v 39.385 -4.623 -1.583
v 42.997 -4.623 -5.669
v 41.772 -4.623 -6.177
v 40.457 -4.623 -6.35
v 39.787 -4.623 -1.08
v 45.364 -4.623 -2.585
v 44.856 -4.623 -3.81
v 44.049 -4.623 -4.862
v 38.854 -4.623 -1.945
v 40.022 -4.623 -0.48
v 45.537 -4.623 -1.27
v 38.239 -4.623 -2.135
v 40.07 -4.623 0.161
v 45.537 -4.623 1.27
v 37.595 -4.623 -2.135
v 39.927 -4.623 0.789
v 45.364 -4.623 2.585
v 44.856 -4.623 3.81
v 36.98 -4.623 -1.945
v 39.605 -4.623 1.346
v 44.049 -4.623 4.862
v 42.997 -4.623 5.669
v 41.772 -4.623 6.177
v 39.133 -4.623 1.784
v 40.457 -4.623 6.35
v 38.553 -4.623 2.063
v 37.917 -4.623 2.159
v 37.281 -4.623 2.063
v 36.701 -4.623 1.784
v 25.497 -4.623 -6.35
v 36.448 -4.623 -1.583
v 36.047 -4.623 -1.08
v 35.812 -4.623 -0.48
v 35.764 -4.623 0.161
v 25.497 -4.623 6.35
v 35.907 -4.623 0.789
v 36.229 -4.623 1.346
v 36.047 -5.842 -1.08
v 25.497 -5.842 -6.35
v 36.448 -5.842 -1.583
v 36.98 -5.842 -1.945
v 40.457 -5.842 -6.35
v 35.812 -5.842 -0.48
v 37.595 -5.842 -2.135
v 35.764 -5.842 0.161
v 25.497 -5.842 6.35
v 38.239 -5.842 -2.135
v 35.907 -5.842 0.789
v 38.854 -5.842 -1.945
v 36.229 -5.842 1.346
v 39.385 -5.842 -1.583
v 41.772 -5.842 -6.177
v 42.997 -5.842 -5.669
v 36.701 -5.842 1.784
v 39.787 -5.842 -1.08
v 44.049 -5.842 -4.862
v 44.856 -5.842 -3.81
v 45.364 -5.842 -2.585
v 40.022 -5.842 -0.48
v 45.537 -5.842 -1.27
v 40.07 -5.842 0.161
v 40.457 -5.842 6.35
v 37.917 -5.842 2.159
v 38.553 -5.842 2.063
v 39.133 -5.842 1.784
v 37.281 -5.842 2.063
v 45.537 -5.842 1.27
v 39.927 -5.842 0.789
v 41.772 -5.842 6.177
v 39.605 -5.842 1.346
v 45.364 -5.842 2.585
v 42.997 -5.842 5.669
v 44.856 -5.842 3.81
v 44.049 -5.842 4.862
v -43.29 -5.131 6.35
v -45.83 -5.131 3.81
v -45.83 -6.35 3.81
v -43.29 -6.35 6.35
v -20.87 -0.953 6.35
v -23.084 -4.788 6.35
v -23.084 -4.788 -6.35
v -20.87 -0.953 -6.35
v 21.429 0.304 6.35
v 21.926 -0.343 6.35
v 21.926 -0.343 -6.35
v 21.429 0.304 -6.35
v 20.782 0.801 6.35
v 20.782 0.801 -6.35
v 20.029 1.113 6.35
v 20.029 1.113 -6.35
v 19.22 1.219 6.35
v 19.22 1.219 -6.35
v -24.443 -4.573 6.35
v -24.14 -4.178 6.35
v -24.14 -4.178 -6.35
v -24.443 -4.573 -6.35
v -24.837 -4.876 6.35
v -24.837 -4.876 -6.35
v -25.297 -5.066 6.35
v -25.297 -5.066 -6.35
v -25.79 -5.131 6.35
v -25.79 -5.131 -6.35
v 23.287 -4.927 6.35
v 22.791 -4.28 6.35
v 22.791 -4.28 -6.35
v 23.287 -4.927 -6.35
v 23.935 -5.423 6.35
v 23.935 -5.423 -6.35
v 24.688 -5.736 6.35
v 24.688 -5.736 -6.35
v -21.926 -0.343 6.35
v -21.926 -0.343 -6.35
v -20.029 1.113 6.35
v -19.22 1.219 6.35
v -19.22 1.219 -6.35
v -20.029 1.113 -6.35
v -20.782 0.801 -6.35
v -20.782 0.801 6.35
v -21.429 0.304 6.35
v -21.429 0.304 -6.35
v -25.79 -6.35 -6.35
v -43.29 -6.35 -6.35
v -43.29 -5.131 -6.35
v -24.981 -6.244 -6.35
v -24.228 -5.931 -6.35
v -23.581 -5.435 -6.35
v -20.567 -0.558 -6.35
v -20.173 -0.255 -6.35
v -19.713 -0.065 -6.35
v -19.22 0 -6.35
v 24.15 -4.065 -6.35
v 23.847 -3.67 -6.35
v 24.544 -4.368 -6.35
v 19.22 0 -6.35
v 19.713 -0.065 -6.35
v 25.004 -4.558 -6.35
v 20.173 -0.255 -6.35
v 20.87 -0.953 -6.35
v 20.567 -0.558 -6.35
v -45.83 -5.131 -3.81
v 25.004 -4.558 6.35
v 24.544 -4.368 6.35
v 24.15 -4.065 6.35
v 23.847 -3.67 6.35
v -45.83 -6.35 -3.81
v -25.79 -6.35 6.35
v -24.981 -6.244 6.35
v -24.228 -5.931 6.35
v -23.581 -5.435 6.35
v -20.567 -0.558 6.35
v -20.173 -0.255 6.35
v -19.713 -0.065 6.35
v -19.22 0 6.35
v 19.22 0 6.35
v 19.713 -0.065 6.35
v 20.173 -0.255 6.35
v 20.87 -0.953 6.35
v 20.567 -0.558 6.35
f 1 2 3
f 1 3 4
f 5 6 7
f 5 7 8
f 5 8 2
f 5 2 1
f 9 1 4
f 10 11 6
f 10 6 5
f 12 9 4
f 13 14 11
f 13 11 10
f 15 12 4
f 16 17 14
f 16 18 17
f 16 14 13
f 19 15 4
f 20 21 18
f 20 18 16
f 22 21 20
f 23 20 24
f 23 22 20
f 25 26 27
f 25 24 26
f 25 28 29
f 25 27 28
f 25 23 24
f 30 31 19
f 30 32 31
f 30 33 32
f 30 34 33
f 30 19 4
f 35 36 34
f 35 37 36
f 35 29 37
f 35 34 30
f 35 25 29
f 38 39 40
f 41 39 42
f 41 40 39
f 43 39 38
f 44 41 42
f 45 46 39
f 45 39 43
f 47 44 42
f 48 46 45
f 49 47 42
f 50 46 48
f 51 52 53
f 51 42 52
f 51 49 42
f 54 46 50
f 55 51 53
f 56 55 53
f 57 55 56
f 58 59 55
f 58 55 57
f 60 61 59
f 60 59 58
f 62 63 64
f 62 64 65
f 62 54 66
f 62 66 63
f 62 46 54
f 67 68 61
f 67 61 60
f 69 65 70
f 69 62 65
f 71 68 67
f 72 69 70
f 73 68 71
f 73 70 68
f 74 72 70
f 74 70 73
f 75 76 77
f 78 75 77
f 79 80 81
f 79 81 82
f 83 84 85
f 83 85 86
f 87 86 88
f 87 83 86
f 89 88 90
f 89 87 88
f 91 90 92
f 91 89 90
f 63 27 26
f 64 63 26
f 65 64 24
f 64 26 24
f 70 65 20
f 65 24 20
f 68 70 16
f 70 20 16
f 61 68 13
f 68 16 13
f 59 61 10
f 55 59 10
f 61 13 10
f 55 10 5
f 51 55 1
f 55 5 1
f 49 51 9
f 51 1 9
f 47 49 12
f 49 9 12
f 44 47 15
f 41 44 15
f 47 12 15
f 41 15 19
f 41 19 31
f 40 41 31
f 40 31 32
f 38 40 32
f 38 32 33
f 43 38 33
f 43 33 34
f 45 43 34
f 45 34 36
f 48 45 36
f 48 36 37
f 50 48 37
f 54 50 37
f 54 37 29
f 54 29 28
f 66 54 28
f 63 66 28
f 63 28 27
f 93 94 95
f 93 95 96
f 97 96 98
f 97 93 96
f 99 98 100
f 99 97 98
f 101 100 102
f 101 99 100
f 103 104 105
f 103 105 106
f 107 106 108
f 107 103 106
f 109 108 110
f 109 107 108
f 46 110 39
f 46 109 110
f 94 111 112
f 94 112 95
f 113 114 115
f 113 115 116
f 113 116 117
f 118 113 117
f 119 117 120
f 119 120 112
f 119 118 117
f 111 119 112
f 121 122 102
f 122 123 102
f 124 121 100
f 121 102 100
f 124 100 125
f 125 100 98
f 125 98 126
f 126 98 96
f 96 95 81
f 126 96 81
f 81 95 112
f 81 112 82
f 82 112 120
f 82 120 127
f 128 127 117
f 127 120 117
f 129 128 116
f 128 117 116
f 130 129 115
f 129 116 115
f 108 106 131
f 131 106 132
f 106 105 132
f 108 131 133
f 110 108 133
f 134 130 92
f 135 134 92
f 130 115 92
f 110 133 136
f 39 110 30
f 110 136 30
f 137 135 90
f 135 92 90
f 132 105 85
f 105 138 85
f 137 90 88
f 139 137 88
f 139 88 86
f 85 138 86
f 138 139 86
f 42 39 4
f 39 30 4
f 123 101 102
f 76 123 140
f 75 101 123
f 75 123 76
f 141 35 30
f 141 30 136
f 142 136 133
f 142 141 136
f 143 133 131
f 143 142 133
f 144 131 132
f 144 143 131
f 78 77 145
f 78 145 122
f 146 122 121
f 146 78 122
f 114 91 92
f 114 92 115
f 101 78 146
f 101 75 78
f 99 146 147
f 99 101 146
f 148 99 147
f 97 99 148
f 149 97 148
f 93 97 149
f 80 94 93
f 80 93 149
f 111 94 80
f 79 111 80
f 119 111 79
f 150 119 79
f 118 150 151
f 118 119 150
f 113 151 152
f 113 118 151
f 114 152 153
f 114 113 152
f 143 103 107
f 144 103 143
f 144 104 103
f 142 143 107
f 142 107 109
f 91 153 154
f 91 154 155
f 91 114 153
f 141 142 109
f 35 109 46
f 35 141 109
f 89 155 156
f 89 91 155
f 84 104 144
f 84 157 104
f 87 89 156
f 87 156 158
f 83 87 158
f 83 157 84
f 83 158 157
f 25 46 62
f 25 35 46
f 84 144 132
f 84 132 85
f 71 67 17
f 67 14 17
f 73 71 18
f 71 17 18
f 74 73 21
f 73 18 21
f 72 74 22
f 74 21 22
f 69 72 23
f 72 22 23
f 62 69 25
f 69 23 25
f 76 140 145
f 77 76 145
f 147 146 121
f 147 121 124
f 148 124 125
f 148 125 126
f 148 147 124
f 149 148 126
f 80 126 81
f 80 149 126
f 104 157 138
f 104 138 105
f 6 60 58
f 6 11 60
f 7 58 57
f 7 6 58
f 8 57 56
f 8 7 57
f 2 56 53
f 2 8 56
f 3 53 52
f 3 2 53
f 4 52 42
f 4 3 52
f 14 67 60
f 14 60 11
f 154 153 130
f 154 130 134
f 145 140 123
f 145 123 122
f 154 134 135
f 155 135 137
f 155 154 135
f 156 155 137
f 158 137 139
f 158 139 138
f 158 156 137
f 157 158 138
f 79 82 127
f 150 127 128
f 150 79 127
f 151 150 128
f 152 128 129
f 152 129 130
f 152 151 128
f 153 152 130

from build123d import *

# Parameters (mm, degrees)
EXTRUDE_THIN1_DEPTH = 6.35
FILLET1_R           = 5.08
CHAMFER1_SIZE       = 2.54
SKETCH2_R           = 2.159
CUT_EXTRUDE1_DEPTH  = 47.635354958


with BuildPart() as part:
    # Sketch1 → Extrude-Thin1 (new, symmetric)
    with BuildSketch(Plane.XY):
        with BuildLine():
            Line((-45.830174209, -6.35), (-25.78993192, -6.35))
            ThreePointArc((-25.78993192, -6.35), (-24.22783192, -5.931436567), (-23.084295354, -4.7879))
            Line((-23.084295354, -4.7879), (-20.869926131, -0.9525))
            ThreePointArc((-20.869926131, -0.9525), (-20.172647737, -0.255221606), (-19.220147737, 0))
            Line((-19.220147737, 0), (19.220147737, 0))
            ThreePointArc((19.220147737, 0), (20.172647737, -0.255221606), (20.869926131, -0.9525))
            Line((20.869926131, -0.9525), (22.791001417, -4.2799))
            ThreePointArc((22.791001417, -4.2799), (23.934537984, -5.423436567), (25.496637984, -5.842))
            Line((25.496637984, -5.842), (45.536880273, -5.842))
            Line((45.536880273, -5.842), (45.536880273, -4.6228))
            Line((45.536880273, -4.6228), (25.496637984, -4.6228))
            ThreePointArc((25.496637984, -4.6228), (24.544137984, -4.367578394), (23.846859589, -3.6703))
            Line((23.846859589, -3.6703), (21.925784304, -0.3429))
            ThreePointArc((21.925784304, -0.3429), (20.782247737, 0.800636567), (19.220147737, 1.2192))
            Line((19.220147737, 1.2192), (-19.220147737, 1.2192))
            ThreePointArc((-19.220147737, 1.2192), (-20.782247737, 0.800636567), (-21.925784304, -0.3429))
            Line((-21.925784304, -0.3429), (-24.140153526, -4.1783))
            ThreePointArc((-24.140153526, -4.1783), (-24.83743192, -4.875578394), (-25.78993192, -5.1308))
            Line((-25.78993192, -5.1308), (-45.830174209, -5.1308))
            Line((-45.830174209, -5.1308), (-45.830174209, -6.35))
        make_face()
    extrude(amount=EXTRUDE_THIN1_DEPTH, both=True)

    # Fillet1
    fillet1_edges = [part.edges().sort_by_distance(p)[0] for p in [
        (45.536880273, -5.2324, -6.35),
        (45.536880273, -5.2324, 6.35),
    ]]
    fillet(fillet1_edges, radius=FILLET1_R)

    # Chamfer1
    chamfer1_edges = [part.edges().sort_by_distance(p)[0] for p in [
        (-45.830174209, -5.7404, -6.35),
        (-45.830174209, -5.7404, 6.35),
    ]]
    chamfer(chamfer1_edges, length=CHAMFER1_SIZE)

    # Sketch2 → Cut-Extrude1 (cut, through all)
    with BuildSketch(Plane(origin=(0, -4.6228, 0), x_dir=(1, 0, 0), z_dir=(0, 1, 0))):
        with Locations(Location((37.916880273, 0, 0), (0, 0, 270))):
            Circle(SKETCH2_R)
    extrude(amount=-CUT_EXTRUDE1_DEPTH, mode=Mode.SUBTRACT)


solid = part.part
